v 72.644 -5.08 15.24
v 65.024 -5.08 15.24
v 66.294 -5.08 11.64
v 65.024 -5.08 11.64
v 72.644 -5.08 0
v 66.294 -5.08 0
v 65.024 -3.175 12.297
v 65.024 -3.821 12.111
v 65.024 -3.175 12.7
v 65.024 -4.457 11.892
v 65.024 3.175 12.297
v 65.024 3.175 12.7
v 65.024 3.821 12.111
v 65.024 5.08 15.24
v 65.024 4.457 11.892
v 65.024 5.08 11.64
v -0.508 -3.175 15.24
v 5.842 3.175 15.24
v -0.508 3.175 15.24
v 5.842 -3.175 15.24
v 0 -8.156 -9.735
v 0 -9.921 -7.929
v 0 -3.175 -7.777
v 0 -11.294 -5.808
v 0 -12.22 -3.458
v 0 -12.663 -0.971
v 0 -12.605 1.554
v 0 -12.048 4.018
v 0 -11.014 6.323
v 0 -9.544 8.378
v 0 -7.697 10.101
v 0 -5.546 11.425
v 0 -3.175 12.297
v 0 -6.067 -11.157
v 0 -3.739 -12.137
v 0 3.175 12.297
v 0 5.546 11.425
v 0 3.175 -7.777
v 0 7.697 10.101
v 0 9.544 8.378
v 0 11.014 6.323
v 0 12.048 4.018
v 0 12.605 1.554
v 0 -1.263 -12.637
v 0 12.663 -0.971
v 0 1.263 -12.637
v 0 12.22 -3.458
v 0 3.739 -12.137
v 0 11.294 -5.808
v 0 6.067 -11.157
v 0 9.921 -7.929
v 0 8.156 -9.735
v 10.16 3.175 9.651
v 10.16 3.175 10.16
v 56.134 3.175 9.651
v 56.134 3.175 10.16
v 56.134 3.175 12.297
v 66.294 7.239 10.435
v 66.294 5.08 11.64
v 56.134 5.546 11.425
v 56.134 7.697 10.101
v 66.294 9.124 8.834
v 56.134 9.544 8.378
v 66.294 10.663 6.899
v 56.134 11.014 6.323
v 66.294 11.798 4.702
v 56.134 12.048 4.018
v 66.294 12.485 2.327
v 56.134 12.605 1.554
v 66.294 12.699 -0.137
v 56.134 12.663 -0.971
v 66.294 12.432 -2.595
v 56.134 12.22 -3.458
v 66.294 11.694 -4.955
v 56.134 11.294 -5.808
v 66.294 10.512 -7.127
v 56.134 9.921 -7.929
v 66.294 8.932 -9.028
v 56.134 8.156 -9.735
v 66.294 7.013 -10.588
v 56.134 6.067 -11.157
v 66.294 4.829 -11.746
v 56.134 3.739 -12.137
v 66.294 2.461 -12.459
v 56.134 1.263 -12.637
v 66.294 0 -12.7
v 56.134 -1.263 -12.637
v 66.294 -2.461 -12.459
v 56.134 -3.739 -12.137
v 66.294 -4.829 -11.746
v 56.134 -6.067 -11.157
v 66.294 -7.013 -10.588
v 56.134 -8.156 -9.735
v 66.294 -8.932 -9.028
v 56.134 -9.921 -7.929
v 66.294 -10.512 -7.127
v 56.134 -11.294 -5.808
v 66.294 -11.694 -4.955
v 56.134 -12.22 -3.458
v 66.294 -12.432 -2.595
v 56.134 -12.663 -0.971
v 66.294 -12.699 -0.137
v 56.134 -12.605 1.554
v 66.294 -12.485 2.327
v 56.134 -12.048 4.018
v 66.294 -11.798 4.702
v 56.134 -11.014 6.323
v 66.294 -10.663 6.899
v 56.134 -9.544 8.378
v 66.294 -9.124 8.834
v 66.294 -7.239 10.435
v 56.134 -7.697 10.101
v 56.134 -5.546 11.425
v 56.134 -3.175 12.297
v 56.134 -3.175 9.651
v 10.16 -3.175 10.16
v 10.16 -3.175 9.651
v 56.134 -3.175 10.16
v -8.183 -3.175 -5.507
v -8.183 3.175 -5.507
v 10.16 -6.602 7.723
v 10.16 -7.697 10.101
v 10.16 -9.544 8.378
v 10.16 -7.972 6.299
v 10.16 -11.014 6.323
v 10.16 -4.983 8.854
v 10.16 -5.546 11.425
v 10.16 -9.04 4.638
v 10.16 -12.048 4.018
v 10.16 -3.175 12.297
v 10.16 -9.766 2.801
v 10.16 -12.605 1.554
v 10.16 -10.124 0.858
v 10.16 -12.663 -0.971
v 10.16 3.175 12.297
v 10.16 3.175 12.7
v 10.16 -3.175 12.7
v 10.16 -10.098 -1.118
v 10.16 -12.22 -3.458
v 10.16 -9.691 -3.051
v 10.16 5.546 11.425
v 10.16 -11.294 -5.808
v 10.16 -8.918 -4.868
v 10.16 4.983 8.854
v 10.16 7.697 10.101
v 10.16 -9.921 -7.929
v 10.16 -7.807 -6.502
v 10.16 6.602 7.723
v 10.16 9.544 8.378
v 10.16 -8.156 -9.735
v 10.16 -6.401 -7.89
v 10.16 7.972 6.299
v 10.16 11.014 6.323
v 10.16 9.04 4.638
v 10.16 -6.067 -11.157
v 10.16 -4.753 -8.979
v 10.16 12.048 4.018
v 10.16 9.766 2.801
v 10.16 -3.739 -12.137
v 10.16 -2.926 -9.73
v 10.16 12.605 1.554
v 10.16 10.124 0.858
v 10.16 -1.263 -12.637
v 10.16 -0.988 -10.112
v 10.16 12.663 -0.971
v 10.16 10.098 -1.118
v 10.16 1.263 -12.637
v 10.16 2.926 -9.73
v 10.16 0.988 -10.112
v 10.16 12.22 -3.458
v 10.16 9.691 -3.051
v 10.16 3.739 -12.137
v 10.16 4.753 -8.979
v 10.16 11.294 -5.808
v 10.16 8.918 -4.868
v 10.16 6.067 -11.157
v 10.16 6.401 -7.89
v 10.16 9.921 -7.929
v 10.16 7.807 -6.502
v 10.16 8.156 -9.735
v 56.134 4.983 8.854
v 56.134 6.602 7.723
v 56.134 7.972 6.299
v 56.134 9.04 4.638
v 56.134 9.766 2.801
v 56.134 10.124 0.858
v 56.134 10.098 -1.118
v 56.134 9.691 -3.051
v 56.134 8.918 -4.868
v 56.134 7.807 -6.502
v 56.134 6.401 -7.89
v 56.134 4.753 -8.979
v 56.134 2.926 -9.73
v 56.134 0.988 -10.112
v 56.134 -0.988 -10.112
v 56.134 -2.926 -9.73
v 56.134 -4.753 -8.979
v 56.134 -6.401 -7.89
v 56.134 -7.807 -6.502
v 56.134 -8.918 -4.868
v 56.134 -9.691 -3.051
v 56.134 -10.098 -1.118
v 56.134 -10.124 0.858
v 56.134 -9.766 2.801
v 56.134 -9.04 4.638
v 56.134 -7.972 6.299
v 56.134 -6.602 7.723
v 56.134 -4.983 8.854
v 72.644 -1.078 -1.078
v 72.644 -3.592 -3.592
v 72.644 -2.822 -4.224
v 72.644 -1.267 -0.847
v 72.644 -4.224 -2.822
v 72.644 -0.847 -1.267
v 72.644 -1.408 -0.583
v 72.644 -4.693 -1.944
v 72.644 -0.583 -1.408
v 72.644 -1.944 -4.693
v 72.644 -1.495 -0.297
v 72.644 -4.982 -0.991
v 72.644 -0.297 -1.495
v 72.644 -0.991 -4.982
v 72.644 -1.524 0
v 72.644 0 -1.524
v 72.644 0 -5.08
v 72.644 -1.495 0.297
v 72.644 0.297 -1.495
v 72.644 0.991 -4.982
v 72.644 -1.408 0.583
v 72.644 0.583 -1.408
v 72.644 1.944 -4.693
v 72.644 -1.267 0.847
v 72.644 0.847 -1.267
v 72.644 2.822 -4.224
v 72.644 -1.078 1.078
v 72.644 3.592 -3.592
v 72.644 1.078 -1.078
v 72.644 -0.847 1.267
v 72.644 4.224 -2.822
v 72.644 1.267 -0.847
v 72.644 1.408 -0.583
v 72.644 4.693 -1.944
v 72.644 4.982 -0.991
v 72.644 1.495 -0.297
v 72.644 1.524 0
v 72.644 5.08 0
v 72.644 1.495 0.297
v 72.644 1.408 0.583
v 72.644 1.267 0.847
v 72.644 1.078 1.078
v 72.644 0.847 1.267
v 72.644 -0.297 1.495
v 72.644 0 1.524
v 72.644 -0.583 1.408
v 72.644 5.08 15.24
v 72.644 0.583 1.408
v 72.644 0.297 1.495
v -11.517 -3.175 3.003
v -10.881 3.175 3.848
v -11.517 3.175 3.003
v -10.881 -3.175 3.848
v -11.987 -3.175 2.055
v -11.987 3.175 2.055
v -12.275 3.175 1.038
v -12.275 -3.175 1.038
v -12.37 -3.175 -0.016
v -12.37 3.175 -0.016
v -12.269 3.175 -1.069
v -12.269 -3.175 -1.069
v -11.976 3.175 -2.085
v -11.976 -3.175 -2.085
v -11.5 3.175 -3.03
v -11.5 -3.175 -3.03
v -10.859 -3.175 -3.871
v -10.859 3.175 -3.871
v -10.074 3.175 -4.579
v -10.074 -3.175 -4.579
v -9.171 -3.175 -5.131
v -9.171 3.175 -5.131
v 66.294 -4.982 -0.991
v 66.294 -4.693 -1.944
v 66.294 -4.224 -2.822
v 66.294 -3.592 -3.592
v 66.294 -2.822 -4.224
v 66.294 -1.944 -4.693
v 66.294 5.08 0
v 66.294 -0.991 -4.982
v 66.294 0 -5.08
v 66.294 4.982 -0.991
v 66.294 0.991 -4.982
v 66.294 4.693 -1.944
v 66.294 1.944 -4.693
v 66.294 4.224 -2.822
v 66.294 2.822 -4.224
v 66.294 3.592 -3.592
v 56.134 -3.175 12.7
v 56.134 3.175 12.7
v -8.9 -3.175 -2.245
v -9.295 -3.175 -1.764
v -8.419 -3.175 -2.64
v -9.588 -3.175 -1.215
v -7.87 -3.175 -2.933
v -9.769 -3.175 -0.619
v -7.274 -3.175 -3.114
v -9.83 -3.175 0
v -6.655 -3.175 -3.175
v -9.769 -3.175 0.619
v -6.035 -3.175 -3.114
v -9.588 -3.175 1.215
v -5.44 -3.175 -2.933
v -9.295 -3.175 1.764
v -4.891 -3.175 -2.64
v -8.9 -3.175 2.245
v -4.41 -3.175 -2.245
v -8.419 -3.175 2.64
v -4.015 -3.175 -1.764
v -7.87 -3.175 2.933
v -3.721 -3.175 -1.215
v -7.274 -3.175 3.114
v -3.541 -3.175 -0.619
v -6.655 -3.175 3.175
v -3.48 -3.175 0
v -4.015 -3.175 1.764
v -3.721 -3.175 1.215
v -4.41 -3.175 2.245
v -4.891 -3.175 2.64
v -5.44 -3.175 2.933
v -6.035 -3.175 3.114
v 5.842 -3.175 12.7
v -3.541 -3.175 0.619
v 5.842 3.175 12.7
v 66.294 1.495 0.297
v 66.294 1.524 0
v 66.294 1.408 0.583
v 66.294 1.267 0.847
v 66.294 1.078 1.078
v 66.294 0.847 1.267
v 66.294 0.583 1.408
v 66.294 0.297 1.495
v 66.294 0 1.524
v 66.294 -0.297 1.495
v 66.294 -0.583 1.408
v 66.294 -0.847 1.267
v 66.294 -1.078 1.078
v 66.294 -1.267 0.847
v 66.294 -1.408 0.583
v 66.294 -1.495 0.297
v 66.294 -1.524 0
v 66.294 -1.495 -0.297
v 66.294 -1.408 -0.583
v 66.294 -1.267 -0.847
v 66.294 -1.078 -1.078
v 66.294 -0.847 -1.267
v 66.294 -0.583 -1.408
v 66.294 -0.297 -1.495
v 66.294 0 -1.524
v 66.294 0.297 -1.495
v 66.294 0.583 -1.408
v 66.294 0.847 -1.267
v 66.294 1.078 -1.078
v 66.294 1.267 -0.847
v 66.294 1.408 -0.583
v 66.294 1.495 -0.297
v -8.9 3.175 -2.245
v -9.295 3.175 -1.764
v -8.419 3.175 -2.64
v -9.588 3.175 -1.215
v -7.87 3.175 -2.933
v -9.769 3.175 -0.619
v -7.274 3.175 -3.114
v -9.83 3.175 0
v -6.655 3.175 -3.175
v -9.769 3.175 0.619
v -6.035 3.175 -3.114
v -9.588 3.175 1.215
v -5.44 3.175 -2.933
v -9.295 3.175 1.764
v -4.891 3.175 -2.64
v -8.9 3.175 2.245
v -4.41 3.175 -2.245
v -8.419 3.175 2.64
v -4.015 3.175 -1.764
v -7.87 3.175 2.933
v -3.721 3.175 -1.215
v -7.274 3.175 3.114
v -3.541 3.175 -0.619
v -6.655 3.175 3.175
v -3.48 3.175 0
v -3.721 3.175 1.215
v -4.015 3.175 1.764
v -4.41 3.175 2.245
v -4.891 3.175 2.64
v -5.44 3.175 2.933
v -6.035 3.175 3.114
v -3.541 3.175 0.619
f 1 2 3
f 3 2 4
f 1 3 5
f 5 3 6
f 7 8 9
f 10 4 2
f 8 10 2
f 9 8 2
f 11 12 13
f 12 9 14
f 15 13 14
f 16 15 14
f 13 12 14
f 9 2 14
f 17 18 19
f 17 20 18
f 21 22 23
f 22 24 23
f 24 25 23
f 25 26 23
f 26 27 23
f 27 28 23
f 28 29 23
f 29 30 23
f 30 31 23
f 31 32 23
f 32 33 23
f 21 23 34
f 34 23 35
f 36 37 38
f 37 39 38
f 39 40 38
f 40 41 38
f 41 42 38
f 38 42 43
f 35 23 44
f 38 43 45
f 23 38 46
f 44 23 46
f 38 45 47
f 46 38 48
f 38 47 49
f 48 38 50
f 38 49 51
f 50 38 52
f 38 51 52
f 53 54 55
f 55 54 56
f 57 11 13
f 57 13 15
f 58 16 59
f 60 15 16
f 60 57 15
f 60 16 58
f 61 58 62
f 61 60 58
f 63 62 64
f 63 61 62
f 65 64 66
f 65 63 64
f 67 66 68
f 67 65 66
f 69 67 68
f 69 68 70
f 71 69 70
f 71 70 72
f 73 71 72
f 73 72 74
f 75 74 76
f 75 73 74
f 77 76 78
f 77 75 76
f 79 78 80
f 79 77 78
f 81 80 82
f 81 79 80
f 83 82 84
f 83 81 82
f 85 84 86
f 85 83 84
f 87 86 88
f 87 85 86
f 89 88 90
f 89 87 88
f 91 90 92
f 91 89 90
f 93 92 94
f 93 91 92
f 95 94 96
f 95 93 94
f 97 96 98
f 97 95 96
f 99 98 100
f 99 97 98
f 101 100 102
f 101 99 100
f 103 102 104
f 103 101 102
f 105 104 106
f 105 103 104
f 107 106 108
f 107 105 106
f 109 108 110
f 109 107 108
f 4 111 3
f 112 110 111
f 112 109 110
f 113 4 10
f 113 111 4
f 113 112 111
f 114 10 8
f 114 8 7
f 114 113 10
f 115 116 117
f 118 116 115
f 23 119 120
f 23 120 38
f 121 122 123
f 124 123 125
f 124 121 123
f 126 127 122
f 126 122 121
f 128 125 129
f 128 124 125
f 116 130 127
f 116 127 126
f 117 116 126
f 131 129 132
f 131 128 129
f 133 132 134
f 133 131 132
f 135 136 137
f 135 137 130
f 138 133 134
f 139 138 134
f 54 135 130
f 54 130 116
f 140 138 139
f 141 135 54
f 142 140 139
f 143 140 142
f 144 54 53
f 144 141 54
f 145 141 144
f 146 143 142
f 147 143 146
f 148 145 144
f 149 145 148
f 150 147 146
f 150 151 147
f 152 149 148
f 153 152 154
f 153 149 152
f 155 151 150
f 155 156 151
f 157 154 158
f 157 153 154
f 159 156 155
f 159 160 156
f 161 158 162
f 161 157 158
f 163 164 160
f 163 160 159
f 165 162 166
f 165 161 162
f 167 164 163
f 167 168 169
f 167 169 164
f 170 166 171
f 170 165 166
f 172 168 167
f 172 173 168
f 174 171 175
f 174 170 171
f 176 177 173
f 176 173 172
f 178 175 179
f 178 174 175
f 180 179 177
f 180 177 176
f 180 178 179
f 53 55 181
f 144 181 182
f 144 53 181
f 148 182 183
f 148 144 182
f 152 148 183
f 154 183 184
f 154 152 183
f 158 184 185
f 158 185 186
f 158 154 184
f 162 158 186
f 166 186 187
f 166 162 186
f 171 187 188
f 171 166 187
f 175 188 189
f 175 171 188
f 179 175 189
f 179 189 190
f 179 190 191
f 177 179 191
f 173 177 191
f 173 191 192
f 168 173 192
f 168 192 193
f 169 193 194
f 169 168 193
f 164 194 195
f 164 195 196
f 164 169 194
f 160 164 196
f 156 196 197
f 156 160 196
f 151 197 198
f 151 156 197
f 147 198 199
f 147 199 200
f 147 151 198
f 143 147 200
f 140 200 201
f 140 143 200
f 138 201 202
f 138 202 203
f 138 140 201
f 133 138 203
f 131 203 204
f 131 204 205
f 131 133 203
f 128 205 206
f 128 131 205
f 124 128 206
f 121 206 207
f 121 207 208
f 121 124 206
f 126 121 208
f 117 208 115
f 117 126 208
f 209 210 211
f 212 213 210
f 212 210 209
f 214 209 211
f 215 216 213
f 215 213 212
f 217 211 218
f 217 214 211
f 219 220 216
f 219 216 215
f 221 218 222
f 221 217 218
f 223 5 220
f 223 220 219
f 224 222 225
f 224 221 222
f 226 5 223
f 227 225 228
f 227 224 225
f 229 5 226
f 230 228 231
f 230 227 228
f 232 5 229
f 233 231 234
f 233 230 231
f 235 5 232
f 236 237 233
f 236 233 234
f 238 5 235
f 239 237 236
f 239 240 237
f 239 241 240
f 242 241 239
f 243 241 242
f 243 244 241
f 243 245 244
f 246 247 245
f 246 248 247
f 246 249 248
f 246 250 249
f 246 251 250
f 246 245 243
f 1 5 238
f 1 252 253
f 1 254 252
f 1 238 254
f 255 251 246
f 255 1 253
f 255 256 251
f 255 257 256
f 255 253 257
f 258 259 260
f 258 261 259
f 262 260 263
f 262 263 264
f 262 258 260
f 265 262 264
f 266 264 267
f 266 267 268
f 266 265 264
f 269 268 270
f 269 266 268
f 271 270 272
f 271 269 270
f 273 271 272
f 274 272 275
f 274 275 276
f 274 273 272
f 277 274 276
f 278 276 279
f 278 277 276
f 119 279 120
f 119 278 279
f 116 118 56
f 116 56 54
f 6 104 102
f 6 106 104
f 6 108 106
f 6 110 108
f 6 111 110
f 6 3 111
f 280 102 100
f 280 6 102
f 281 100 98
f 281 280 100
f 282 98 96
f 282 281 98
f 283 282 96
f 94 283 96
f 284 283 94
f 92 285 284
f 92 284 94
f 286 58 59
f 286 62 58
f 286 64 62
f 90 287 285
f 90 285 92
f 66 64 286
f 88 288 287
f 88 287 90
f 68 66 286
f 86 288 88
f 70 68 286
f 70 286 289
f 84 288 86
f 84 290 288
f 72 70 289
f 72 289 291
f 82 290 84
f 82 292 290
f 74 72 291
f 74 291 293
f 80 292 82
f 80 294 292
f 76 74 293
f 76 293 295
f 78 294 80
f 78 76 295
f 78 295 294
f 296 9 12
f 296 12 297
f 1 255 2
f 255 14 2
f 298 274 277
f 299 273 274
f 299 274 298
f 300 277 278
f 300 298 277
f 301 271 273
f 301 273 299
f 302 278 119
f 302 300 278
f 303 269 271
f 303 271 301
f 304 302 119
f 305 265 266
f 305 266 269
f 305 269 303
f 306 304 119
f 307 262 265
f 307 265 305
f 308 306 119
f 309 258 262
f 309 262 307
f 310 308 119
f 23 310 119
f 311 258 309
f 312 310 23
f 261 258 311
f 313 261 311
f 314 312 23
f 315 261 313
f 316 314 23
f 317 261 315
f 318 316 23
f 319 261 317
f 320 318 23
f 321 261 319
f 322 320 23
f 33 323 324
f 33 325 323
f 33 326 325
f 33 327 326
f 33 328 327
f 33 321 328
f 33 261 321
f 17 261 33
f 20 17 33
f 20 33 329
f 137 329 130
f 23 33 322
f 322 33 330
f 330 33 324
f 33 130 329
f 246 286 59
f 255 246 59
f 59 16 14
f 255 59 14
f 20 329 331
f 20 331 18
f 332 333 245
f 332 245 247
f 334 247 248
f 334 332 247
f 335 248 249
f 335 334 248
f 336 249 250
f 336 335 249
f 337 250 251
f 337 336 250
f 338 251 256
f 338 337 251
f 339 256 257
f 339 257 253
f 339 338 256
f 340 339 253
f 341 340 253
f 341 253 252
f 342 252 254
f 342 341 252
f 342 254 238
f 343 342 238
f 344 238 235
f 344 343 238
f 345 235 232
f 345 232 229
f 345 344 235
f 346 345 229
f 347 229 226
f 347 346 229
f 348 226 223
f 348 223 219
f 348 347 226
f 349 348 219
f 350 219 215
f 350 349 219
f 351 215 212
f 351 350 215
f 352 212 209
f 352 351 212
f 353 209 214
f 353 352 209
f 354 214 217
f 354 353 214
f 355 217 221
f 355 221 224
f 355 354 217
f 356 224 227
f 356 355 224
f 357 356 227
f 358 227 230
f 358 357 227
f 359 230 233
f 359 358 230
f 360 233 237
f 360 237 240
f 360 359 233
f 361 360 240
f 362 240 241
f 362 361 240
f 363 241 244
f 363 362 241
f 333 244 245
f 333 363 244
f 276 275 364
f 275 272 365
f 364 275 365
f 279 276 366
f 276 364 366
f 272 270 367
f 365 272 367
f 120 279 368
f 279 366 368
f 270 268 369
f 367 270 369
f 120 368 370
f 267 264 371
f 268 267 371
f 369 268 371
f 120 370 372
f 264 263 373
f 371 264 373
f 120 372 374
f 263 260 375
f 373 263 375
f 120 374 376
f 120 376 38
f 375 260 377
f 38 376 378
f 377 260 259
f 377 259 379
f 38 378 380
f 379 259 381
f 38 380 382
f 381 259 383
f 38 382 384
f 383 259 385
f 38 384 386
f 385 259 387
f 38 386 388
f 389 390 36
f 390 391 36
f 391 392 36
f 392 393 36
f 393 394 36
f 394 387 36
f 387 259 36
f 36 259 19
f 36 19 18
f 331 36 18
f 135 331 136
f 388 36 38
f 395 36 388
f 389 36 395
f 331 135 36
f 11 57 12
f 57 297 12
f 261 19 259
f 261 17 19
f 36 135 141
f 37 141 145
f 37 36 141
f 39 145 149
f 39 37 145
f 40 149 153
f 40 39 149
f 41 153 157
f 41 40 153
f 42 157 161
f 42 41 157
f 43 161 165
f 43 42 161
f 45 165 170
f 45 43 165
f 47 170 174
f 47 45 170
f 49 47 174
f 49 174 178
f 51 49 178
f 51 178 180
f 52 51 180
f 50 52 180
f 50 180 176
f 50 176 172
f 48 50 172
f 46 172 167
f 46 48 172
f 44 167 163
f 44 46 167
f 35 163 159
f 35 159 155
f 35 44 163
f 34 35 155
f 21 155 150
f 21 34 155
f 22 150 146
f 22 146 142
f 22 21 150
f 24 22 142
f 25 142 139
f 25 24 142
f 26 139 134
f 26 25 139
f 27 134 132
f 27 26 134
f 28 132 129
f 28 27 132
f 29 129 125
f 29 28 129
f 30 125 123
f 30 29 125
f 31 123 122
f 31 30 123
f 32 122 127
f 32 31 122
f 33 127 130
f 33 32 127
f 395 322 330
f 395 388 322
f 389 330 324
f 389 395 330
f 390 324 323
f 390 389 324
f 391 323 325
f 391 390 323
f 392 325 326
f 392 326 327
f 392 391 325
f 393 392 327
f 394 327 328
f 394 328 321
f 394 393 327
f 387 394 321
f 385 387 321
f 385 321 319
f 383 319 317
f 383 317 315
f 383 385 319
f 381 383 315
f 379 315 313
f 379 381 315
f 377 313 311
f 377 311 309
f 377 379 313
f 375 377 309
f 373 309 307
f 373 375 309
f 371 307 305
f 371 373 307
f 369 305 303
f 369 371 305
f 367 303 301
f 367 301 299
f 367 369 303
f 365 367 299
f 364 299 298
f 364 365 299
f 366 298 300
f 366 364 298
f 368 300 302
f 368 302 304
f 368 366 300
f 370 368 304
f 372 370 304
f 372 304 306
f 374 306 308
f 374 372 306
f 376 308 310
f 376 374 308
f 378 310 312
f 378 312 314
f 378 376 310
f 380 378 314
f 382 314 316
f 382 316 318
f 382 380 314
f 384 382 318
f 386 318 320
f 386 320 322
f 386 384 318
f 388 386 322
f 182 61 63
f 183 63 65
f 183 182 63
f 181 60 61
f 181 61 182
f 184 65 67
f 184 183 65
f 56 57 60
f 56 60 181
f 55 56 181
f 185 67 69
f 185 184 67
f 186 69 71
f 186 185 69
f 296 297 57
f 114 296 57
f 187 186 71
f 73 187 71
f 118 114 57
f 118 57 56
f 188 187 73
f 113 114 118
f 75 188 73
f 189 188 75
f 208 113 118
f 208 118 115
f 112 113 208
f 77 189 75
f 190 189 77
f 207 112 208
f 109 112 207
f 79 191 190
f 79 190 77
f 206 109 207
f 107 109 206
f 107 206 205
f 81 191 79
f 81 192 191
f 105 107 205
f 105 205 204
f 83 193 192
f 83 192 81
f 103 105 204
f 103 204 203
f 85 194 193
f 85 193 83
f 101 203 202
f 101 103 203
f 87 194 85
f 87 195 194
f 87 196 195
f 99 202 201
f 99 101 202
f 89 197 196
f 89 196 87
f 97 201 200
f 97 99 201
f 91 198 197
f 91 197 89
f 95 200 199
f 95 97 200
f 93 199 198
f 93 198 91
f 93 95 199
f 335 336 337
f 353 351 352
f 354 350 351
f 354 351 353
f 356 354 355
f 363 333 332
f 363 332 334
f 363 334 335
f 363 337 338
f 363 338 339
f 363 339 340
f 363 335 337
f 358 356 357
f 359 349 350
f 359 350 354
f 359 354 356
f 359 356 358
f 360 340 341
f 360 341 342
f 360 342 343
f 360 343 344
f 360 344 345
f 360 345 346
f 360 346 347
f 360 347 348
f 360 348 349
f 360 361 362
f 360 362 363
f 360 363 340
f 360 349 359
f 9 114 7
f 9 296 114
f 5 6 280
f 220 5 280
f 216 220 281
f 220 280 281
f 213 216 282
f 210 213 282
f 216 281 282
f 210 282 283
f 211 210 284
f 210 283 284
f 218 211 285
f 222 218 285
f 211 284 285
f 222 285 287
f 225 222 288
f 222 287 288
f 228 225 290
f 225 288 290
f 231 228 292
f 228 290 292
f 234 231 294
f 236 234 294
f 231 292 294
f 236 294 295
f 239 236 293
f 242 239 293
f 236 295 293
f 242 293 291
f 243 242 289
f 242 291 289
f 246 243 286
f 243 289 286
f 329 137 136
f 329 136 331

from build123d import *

# Parameters (mm, degrees)
F0_W          = 5.842
F0_H          = 12.7
F0_R          = 3.175
F2_DEPTH      = 3.175
F3_R          = 1.524
F4_DEPTH      = 1.27
F4_DEPTH_BACK = 6.35


with BuildPart() as f1:
    # F0 (on Front) → F1 (revolve)
    with BuildSketch(Plane.XZ):
        Polygon((5.842, 12.7), (5.842, 0), (66.294, 0), (66.294, 12.7), (56.134, 12.7), (56.134, 10.16), (10.16, 10.16), (10.16, 12.7), align=None)
        with Locations((2.921, 6.35)):
            Rectangle(F0_W, F0_H)
    revolve(axis=Axis((33.147, 0, 0), (-1, 0, 0)))

    # F0 (on Front) → F2 (join, symmetric)
    with BuildSketch(Plane.XZ):
        Polygon((5.842, 12.7), (5.842, 0), (66.294, 0), (66.294, 12.7), (56.134, 12.7), (56.134, 10.16), (10.16, 10.16), (10.16, 12.7), align=None)
        with Locations((2.921, 6.35)):
            Rectangle(F0_W, F0_H)
        with BuildLine():
            Line((-0.9398, 0), (0, 0))
            Line((0, 0), (0, 12.7))
            Line((0, 12.7), (5.842, 12.7))
            Line((5.842, 12.7), (5.842, 15.24))
            Line((5.842, 15.24), (-0.508, 15.24))
            Line((-0.508, 15.24), (-10.8806298187, 3.8475430269))
            ThreePointArc((-10.8806298187, 3.8475430269), (-4.5919612295, 5.3297205562), (-0.9398, 0))
        make_face()
        with BuildLine():
            Line((5.842, 0), (0, 0))
            Line((0, 0), (-0.9398, 0))
            ThreePointArc((-0.9398, 0), (-3.1957909266, -4.5493385486), (-8.1826630726, -5.5069827884))
            Line((-8.1826630726, -5.5069827884), (5.842, -9.398))
            Line((5.842, -9.398), (5.842, 0))
        make_face()
        with BuildLine():
            ThreePointArc((-8.1826630726, -5.5069827884), (-3.1957909266, -4.5493385486), (-0.9398, 0))
            ThreePointArc((-0.9398, 0), (-4.5919612295, 5.3297205562), (-10.8806298187, 3.8475430269))
            ThreePointArc((-10.8806298187, 3.8475430269), (-12.1459778134, -1.5837270034), (-8.1826630726, -5.5069827884))
        make_face()
        with Locations((-6.6548, 0)):
            Circle(F0_R, mode=Mode.SUBTRACT)
    extrude(amount=F2_DEPTH, both=True)

    # F3 (on face) → F4 (join, two sides)
    with BuildSketch(Plane.YZ.offset(66.294)) as f4_sk:
        with BuildLine():
            ThreePointArc((-5.08, 0), (0, -5.08), (5.08, 0))
            ThreePointArc((5.08, 0), (0, 5.08), (-5.08, 0))
        make_face()
        Circle(F3_R, mode=Mode.SUBTRACT)
        with BuildLine():
            ThreePointArc((-5.08, 0), (0, 5.08), (5.08, 0))
            Line((5.08, 0), (5.08, 15.24))
            Line((5.08, 15.24), (-5.08, 15.24))
            Line((-5.08, 15.24), (-5.08, 0))
        make_face()
    extrude(amount=-F4_DEPTH)
    extrude(f4_sk.sketch, amount=F4_DEPTH_BACK)


solid = f1.part
